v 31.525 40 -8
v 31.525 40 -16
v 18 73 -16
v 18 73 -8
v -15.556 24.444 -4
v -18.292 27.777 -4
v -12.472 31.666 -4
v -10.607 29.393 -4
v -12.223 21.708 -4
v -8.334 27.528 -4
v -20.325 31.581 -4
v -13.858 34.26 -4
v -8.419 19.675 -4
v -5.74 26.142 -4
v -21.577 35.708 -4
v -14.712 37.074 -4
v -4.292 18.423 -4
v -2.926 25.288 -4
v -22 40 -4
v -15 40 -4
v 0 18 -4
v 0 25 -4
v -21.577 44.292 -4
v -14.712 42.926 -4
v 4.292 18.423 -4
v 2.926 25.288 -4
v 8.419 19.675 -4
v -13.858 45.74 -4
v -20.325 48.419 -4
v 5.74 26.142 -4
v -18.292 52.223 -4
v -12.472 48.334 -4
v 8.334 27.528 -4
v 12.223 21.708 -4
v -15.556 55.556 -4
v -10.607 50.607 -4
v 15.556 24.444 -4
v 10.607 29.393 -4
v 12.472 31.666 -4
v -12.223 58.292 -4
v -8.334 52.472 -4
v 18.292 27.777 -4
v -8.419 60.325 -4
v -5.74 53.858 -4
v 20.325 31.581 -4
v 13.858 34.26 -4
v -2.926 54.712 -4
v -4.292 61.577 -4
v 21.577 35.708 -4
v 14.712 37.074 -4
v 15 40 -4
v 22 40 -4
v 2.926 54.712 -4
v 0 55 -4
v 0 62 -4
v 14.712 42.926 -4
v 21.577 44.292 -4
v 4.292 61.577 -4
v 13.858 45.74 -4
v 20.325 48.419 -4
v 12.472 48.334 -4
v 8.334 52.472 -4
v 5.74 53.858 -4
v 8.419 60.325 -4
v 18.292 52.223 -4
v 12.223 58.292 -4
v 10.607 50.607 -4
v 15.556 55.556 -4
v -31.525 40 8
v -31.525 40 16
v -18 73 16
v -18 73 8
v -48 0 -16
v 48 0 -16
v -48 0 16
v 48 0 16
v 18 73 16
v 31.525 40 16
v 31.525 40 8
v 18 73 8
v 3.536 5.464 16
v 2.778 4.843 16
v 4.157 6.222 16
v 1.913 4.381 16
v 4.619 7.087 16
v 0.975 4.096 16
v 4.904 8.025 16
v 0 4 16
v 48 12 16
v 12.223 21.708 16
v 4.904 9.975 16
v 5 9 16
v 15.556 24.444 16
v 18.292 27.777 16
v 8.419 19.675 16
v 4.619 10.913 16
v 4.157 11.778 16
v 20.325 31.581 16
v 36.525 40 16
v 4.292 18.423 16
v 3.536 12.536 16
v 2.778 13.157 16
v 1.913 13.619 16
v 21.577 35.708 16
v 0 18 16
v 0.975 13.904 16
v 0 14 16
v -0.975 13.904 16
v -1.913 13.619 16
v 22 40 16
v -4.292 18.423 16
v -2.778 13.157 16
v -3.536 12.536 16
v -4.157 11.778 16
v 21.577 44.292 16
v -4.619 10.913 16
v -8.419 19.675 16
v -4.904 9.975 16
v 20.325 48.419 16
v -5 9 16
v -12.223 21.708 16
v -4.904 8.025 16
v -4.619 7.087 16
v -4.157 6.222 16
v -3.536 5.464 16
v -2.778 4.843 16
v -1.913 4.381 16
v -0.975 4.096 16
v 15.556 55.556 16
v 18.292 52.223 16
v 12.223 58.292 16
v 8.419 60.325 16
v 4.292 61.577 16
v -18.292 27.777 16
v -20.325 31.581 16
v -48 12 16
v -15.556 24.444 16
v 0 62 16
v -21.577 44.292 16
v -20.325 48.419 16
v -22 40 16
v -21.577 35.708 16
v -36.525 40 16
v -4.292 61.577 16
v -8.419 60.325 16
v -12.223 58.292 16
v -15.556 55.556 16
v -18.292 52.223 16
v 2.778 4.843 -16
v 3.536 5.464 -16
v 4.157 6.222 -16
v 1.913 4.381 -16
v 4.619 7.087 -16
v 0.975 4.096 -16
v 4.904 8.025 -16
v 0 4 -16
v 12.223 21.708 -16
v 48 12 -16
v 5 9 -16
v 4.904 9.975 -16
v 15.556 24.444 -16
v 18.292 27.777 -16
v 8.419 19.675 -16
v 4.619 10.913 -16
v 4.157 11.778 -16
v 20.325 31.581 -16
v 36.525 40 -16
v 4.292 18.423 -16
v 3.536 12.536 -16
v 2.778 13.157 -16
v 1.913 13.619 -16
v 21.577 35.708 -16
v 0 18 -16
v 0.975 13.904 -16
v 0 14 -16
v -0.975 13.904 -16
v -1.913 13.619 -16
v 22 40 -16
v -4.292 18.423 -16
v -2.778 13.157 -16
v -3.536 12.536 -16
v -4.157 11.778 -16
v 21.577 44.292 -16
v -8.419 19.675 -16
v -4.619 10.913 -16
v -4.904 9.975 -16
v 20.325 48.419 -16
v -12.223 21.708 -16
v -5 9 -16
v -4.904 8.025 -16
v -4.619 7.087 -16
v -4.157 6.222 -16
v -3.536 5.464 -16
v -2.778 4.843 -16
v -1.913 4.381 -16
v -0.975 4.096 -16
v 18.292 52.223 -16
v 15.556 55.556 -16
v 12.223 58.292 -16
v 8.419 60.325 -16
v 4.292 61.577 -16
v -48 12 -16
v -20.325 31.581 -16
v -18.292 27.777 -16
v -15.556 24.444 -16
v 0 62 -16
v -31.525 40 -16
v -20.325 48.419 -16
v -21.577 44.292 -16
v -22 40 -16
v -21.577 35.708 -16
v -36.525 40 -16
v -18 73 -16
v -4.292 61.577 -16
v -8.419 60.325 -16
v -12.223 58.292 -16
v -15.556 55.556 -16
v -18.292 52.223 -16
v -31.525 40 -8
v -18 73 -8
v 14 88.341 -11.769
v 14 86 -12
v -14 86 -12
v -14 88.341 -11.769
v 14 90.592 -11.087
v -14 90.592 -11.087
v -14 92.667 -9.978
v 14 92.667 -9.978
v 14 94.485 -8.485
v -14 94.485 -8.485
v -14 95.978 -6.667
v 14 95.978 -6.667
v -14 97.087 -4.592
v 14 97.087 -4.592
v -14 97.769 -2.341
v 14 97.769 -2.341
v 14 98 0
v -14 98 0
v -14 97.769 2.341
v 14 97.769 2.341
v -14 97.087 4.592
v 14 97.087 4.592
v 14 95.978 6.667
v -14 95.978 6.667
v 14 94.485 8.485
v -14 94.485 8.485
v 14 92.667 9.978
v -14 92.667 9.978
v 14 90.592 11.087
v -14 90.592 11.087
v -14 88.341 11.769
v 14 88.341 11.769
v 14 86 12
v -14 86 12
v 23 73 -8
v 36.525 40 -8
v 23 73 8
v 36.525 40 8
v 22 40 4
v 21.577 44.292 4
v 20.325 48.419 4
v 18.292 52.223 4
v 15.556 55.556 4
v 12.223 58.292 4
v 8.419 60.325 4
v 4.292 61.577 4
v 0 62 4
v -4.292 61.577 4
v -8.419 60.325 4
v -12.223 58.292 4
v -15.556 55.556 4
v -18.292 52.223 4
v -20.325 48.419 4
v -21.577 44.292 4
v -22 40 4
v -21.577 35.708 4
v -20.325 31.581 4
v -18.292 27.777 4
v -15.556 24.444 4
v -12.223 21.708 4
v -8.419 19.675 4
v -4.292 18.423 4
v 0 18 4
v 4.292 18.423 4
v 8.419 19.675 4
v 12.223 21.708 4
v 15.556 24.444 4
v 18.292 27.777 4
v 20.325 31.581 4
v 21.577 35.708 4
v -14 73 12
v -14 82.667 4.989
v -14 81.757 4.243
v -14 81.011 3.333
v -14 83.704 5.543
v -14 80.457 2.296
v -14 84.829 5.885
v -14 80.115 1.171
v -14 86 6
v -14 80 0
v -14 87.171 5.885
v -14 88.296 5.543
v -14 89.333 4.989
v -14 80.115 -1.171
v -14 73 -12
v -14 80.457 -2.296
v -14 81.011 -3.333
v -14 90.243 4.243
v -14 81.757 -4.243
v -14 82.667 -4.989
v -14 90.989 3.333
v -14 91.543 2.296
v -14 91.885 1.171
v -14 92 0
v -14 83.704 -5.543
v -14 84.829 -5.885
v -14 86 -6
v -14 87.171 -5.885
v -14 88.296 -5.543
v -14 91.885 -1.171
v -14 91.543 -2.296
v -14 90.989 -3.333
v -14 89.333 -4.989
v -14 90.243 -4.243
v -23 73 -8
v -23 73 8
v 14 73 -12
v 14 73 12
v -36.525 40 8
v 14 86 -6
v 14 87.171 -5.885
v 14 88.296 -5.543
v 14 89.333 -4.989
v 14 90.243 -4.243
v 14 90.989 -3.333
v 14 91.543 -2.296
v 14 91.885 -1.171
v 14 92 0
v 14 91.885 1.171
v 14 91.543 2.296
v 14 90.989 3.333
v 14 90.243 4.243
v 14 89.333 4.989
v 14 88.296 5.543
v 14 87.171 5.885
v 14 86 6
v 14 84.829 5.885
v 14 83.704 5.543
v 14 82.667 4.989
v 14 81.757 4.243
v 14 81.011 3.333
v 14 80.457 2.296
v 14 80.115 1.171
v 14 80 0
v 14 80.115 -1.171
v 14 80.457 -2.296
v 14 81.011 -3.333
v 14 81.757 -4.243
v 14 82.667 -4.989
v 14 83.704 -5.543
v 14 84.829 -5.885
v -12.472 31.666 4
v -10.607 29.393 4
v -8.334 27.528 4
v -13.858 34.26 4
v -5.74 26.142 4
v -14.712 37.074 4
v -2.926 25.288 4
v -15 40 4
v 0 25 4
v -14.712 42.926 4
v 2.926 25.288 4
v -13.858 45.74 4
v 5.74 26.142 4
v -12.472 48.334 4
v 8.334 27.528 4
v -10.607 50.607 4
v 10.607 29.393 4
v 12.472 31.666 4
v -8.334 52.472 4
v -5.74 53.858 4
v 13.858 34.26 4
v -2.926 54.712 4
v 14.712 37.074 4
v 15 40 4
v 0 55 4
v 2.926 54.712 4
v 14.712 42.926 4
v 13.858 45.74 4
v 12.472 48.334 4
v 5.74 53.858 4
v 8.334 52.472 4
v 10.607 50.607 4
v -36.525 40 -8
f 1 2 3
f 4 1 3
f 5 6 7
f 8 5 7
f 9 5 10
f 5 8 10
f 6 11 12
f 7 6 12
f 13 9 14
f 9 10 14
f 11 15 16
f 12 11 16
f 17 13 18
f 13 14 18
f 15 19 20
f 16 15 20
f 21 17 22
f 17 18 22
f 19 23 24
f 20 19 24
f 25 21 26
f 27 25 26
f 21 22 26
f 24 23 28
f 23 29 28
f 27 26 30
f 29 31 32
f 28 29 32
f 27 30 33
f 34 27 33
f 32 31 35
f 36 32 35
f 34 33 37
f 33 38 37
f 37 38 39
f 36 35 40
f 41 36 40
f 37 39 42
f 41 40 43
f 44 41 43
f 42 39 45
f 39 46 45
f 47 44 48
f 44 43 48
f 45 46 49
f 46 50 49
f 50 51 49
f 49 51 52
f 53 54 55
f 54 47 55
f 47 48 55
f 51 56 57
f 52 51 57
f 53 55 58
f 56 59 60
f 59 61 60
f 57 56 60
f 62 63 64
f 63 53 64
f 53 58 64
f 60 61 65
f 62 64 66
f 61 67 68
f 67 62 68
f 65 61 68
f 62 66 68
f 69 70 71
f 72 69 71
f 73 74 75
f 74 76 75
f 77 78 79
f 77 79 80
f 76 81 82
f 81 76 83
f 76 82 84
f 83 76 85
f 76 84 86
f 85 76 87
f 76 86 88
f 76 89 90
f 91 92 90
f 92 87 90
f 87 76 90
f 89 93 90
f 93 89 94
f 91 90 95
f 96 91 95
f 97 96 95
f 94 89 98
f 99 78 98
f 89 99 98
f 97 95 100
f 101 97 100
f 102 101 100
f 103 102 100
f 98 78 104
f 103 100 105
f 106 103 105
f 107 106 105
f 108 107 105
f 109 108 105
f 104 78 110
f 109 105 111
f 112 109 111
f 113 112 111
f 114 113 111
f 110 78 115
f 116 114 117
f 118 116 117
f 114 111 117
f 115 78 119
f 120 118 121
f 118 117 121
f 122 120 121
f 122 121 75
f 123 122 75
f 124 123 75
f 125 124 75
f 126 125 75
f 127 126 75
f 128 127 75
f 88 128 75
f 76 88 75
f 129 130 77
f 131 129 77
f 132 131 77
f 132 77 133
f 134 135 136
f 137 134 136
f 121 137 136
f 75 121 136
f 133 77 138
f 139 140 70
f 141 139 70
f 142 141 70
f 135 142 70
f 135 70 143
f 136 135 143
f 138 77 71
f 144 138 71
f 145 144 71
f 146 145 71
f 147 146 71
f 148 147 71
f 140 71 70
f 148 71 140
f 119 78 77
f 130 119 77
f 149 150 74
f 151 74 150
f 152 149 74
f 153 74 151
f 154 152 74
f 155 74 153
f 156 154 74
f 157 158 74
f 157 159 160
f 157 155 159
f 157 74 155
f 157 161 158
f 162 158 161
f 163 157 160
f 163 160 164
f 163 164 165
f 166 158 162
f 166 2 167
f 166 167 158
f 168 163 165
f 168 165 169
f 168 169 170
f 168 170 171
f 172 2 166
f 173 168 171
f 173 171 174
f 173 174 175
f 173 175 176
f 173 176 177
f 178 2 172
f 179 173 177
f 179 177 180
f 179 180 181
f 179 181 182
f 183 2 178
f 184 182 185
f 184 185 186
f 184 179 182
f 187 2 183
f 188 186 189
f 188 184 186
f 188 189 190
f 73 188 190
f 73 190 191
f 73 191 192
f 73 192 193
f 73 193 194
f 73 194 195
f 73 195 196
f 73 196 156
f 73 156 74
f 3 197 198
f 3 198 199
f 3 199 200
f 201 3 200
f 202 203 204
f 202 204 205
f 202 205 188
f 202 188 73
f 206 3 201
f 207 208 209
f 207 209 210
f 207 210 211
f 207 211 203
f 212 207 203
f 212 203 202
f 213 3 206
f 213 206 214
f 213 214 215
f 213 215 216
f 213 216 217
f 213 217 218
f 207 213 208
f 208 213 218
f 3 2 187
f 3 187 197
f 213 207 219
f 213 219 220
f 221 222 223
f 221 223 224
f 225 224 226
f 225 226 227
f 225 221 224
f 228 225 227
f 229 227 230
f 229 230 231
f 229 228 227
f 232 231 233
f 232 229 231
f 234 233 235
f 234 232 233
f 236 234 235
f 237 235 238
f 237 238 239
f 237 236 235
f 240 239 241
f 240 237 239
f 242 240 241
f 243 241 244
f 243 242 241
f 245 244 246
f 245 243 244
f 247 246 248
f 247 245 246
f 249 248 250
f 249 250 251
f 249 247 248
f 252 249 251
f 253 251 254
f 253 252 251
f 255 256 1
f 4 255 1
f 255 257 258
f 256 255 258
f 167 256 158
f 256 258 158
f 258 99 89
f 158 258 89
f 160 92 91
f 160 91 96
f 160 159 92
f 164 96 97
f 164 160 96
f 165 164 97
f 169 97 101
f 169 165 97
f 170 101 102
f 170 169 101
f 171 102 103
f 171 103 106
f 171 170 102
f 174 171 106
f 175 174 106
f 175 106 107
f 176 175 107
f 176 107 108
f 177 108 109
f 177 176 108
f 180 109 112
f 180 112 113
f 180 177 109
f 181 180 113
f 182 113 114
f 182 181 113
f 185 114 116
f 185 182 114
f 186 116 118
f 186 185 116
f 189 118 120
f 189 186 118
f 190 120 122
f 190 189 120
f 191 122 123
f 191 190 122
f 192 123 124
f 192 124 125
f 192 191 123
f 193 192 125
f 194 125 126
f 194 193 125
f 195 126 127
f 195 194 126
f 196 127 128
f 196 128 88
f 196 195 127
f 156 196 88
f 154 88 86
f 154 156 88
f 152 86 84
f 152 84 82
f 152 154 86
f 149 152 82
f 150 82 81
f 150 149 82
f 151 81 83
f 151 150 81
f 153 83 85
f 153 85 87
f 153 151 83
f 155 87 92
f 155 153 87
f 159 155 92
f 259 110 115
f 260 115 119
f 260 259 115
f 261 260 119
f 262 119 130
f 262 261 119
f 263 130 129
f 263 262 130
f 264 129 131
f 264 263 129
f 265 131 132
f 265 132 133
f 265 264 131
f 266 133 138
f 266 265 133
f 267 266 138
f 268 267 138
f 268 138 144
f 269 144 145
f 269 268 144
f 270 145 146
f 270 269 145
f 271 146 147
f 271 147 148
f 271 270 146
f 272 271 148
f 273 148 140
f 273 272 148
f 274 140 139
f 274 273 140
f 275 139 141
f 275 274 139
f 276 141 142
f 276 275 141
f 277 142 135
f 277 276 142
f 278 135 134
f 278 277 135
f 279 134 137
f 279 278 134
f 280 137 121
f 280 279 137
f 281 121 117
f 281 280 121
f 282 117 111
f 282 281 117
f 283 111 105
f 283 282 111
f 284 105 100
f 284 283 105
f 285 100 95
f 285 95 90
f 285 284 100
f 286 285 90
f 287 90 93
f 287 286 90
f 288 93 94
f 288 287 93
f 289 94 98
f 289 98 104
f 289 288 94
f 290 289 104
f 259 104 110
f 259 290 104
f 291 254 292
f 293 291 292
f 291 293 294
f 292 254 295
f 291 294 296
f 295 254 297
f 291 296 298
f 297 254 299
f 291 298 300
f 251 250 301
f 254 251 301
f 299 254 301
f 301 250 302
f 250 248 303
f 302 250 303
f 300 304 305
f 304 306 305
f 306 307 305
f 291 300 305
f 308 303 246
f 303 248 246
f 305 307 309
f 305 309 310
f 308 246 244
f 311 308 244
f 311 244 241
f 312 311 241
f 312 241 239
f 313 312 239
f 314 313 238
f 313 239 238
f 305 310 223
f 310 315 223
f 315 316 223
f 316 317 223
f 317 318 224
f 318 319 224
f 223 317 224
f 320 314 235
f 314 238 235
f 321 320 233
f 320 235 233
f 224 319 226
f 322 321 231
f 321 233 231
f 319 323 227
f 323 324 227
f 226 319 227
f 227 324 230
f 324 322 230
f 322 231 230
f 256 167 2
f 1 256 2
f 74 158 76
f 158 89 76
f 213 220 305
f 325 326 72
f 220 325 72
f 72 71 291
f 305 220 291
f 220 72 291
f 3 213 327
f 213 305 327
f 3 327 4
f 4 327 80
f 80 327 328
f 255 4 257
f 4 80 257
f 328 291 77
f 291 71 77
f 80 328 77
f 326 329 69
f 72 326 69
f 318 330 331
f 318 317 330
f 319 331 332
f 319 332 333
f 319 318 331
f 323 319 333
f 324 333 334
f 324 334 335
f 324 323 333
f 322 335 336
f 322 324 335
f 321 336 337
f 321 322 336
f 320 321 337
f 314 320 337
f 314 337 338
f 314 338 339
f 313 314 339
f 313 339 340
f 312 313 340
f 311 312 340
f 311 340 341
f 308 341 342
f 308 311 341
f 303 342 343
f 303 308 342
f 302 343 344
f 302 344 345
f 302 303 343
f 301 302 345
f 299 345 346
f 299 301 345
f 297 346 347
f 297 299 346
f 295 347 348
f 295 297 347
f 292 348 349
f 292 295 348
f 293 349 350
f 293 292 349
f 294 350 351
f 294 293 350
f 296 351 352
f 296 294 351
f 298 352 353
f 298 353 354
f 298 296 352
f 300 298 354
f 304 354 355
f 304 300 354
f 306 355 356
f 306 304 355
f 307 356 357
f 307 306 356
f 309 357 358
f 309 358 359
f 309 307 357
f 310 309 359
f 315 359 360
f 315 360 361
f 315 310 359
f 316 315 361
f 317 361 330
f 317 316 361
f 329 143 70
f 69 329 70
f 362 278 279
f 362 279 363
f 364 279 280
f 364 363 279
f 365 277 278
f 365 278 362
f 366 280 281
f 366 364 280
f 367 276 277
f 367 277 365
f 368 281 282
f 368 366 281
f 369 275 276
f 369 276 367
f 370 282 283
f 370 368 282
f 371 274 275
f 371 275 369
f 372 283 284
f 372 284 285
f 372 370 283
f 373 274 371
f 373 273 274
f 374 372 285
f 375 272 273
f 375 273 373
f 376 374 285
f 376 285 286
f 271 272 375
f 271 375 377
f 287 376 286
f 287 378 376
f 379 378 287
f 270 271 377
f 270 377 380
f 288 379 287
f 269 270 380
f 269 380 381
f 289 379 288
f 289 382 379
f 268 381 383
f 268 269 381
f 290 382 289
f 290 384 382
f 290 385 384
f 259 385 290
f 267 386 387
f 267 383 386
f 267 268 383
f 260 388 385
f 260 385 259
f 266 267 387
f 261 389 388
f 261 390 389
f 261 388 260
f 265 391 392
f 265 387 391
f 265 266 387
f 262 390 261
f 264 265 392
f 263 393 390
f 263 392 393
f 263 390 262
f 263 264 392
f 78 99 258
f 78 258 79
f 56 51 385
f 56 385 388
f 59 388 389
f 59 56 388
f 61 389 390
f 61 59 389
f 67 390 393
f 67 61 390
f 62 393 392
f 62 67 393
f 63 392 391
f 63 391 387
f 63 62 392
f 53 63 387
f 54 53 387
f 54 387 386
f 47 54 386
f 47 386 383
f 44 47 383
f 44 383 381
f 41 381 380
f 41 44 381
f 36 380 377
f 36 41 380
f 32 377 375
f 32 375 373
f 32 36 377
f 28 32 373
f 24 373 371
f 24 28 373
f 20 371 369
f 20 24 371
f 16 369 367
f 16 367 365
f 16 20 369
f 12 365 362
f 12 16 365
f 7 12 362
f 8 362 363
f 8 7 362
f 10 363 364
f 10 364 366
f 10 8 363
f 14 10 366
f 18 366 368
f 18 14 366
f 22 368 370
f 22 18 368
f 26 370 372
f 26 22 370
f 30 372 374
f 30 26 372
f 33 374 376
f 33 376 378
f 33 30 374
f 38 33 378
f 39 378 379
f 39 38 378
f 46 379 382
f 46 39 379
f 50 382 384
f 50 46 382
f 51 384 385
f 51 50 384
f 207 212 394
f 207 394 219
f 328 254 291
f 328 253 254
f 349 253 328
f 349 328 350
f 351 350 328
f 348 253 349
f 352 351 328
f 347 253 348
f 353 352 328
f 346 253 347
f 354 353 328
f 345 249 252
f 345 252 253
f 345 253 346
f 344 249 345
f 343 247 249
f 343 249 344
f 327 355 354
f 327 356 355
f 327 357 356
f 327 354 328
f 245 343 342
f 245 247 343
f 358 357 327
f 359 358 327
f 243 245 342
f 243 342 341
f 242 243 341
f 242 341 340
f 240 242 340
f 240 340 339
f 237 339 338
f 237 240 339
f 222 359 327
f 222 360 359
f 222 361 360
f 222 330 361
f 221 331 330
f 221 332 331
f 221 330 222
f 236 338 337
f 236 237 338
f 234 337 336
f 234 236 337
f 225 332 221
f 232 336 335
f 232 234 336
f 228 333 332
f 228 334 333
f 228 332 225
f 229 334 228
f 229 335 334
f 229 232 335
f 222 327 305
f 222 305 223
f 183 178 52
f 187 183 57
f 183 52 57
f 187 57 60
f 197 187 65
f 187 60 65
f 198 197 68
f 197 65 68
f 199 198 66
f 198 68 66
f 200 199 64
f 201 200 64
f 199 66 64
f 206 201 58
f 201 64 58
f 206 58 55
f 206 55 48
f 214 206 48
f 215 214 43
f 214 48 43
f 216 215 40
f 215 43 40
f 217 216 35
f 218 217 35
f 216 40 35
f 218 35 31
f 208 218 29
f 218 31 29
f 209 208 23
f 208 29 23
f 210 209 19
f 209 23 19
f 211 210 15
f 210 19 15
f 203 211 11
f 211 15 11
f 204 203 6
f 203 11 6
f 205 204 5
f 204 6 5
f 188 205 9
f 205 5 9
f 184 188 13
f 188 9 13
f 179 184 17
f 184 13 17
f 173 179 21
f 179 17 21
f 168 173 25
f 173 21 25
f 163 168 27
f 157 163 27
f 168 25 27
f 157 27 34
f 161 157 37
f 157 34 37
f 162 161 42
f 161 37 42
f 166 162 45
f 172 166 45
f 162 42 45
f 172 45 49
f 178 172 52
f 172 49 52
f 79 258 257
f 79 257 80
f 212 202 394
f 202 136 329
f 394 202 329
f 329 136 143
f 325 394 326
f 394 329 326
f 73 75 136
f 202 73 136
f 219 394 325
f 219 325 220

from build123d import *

# Parameters (mm, degrees)
CROQUIS1_R              = 15
CROQUIS1_R_2            = 5
SALIENTE_EXTRUIR1_DEPTH = 16
CORTAR_EXTRUIR1_START   = -12
CROQUIS2_R              = 22
CROQUIS2_R_2            = 15
CORTAR_EXTRUIR1_DEPTH   = 12
CORTAR_EXTRUIR2_DEPTH   = 8
CROQUIS4_R              = 6
SALIENTE_EXTRUIR2_DEPTH = 14


with BuildPart() as part:
    # Croquis1 → Saliente-Extruir1 (new, symmetric)
    with BuildSketch(Plane.XY):
        Polygon((-23, 73), (23, 73), (48, 12), (48, 0), (-48, 0), (-48, 12), align=None)
        with Locations((0, 40)):
            Circle(CROQUIS1_R, mode=Mode.SUBTRACT)
        with Locations((0, 9)):
            Circle(CROQUIS1_R_2, mode=Mode.SUBTRACT)
    extrude(amount=SALIENTE_EXTRUIR1_DEPTH, both=True)

    # Croquis2 → Cortar-Extruir1 (cut)
    with BuildSketch(Plane.XY.offset(16).offset(CORTAR_EXTRUIR1_START)):
        with Locations((0, 40)):
            Circle(CROQUIS2_R)
        with Locations((0, 40)):
            Circle(CROQUIS2_R_2, mode=Mode.SUBTRACT)
    cortar_extruir1 = extrude(amount=CORTAR_EXTRUIR1_DEPTH, mode=Mode.SUBTRACT)

    # Croquis3 → Cortar-Extruir2 (cut)
    with BuildSketch(Plane.XY.offset(16)):
        Polygon((23, 73), (36.524590164, 40), (31.524590164, 40), (18, 73), align=None)
        Polygon((-18, 73), (-23, 73), (-36.524590164, 40), (-31.524590164, 40), align=None)
    cortar_extruir2 = extrude(amount=-CORTAR_EXTRUIR2_DEPTH, mode=Mode.SUBTRACT)

    # Simetría1: Cortar-Extruir1, Cortar-Extruir2 across plane
    add(cortar_extruir1.mirror(Plane.XY), mode=Mode.SUBTRACT)
    add(cortar_extruir2.mirror(Plane.XY), mode=Mode.SUBTRACT)

    # Croquis4 → Saliente-Extruir2 (add, symmetric)
    with BuildSketch(Plane(origin=(0, 0, 0), x_dir=(0, 0, -1), z_dir=(1, 0, 0))):
        with BuildLine():
            Line((-12, 73), (12, 73))
            Line((12, 73), (12, 86))
            ThreePointArc((12, 86), (0, 98), (-12, 86))
            Line((-12, 86), (-12, 73))
        make_face()
        with Locations((0, 86)):
            Circle(CROQUIS4_R, mode=Mode.SUBTRACT)
    extrude(amount=SALIENTE_EXTRUIR2_DEPTH, both=True)


solid = part.part
